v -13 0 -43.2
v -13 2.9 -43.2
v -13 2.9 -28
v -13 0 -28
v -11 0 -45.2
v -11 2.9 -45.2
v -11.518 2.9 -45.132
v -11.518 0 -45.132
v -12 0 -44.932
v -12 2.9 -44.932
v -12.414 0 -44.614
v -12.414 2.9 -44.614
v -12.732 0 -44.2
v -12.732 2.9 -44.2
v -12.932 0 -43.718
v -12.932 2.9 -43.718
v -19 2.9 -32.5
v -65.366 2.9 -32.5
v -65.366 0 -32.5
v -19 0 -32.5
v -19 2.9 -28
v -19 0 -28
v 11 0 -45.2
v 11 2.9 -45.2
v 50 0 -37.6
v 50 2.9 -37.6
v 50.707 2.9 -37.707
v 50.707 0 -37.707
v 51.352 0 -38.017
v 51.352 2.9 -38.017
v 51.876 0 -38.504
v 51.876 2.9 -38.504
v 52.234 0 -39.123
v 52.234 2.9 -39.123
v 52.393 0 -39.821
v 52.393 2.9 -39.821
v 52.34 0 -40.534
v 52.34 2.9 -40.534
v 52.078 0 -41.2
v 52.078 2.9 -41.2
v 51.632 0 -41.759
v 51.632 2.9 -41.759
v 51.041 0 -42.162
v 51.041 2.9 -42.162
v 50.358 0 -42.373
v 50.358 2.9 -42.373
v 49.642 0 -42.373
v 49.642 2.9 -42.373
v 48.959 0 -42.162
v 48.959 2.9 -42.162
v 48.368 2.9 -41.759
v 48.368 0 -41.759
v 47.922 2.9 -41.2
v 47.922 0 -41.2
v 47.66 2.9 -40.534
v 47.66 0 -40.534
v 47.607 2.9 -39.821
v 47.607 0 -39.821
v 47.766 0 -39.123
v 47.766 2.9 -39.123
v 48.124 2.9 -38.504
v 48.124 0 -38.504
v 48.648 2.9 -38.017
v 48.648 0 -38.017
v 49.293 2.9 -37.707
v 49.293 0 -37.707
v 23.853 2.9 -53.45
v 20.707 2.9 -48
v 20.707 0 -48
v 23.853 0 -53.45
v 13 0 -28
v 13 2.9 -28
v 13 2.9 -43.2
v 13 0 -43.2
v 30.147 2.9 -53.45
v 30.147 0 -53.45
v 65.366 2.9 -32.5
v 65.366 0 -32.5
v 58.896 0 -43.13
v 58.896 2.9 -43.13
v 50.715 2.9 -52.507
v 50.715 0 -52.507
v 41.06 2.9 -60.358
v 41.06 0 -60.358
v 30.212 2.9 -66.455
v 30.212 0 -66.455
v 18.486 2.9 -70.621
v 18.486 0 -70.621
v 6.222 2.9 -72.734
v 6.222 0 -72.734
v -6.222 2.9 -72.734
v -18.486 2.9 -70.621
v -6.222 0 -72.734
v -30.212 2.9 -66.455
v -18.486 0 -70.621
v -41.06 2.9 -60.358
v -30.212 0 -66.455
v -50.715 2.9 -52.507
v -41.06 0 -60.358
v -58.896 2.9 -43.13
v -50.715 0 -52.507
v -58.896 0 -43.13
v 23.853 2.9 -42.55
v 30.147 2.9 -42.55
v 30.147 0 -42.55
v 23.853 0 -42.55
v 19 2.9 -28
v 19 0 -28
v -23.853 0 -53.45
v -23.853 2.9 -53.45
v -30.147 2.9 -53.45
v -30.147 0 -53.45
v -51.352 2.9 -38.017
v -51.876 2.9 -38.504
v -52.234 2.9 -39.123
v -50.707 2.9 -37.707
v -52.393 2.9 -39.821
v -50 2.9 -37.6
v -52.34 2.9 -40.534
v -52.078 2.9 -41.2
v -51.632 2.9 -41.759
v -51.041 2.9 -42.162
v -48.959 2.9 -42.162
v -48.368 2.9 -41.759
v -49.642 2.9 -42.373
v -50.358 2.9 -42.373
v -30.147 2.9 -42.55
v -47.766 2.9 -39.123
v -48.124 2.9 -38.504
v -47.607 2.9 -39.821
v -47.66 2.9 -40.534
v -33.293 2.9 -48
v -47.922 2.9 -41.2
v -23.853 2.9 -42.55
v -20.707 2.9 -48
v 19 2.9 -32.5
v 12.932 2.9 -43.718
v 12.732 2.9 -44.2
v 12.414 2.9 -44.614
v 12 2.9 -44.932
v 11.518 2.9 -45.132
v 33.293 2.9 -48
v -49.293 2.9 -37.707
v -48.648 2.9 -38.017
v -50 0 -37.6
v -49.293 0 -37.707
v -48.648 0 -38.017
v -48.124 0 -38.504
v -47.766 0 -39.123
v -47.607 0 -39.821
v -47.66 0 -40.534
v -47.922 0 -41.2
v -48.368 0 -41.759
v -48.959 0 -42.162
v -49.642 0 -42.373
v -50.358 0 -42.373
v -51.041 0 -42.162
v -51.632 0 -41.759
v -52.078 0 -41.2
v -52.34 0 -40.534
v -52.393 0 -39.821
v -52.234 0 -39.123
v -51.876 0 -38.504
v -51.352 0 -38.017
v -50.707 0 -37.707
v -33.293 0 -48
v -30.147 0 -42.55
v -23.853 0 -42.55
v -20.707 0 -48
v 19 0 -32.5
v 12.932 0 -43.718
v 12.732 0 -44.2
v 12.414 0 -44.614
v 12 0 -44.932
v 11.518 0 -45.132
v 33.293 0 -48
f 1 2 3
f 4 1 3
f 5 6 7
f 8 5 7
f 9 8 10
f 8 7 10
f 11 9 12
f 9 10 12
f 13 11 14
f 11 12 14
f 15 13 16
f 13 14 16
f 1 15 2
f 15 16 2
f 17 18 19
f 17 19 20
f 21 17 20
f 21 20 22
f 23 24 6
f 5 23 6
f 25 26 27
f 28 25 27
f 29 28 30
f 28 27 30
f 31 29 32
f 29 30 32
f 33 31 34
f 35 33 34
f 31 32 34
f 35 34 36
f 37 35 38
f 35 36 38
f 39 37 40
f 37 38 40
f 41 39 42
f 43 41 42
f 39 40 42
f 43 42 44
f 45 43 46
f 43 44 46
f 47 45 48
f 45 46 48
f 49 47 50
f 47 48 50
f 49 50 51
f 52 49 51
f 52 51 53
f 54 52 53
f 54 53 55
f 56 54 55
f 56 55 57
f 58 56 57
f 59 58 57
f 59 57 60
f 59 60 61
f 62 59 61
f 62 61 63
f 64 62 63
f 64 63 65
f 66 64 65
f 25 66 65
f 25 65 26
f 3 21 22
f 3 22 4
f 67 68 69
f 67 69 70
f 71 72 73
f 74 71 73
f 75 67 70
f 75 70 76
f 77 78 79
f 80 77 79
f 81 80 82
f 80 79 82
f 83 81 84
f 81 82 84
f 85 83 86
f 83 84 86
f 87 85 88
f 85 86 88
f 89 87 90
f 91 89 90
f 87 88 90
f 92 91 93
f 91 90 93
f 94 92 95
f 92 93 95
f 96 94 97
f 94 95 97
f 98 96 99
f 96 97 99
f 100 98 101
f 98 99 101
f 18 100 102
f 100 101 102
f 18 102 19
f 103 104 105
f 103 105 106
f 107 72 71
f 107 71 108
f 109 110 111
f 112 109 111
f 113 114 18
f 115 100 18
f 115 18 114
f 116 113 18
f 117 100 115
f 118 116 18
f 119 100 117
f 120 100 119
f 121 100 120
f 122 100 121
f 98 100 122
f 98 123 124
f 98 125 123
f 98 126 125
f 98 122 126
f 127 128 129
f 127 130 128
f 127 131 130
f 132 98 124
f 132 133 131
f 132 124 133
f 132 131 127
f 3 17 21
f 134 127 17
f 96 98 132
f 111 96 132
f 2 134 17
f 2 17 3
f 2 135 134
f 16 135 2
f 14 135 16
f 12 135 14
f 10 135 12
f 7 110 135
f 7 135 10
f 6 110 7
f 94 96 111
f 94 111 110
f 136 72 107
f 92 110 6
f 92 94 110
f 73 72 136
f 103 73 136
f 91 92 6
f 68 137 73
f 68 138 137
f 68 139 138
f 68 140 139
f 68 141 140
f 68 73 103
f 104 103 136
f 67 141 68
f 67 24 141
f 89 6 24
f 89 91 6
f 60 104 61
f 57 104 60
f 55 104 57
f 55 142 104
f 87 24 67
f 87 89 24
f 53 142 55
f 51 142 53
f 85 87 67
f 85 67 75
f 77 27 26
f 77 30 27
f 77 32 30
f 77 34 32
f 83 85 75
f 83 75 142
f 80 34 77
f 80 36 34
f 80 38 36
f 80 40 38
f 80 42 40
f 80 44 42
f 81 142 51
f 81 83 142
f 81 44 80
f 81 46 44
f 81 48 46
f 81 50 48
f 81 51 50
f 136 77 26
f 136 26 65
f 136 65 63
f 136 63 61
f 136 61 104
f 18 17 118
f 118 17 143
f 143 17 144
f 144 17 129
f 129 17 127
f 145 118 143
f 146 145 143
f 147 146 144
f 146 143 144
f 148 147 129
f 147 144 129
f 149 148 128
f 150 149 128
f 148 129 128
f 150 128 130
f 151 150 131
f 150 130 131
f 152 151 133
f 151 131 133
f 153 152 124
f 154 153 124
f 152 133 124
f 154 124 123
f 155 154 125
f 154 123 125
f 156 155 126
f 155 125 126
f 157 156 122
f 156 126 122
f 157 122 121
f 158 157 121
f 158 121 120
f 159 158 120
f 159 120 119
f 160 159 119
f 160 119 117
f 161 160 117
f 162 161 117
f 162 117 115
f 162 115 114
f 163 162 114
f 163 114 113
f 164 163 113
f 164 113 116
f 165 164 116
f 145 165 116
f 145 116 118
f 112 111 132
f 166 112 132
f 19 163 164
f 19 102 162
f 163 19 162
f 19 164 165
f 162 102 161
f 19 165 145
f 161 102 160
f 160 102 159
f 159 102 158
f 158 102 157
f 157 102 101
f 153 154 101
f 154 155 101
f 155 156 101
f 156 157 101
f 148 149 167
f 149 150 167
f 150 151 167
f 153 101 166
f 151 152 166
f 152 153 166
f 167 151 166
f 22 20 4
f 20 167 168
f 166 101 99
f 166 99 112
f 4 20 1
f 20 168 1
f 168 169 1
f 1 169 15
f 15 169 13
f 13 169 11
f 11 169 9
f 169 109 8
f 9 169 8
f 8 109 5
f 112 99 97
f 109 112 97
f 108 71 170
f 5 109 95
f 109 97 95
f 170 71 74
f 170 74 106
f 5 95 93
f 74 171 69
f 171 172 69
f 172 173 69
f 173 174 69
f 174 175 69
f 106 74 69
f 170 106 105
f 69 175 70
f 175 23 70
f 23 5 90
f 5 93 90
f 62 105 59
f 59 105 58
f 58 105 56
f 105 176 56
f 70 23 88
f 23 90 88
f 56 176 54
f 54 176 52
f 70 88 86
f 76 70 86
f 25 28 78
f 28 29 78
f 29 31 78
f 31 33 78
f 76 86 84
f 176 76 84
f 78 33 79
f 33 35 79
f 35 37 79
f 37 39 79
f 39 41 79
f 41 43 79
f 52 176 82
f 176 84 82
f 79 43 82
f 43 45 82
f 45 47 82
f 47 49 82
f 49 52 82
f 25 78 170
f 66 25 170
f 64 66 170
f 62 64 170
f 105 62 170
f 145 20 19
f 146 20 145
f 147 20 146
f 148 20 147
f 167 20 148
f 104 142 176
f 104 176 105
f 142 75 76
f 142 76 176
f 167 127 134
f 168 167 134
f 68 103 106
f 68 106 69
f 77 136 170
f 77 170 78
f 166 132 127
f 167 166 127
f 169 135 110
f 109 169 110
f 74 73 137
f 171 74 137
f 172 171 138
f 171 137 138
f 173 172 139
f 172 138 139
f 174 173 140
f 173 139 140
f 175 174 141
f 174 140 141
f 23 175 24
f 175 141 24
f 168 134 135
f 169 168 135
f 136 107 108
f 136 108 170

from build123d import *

# Parameters (mm, degrees)
BOSS_EXTRUDE1_DEPTH  = 2.9
SOLENOID_PLACEMENT_W = 38
SOLENOID_PLACEMENT_H = 64
CUT_EXTRUDE1_DEPTH   = 104.278313309
CUT_EXTRUDE4_DEPTH   = 104.278313309
CUT_EXTRUDE5_DEPTH   = 104.278313309
SKETCH6_R            = 2.4
CUT_EXTRUDE6_DEPTH   = 104.278313309
CUT_EXTRUDE3_DEPTH   = 104.278313309
SKETCH7_W            = 10
SKETCH7_H            = 62.80248699
CUT_EXTRUDE7_DEPTH   = 99.031423533


with BuildPart() as part:
    # Sketch1 → Boss-Extrude1 (new body)
    with BuildSketch(Plane(origin=(0, 0, 0), x_dir=(1, 0, 0), z_dir=(0, 1, 0))):
        with BuildLine():
            ThreePointArc((36.856602833, -63.012624351), (0, 73), (-36.856602833, -63.012624351))
            ThreePointArc((-36.856602833, -63.012624351), (-33.368752207, -63.602994345), (-30.363140064, -61.737536127))
            ThreePointArc((-30.363140064, -61.737536127), (0, -46.75), (30.363140064, -61.737536127))
            ThreePointArc((30.363140064, -61.737536127), (33.368752207, -63.602994345), (36.856602833, -63.012624351))
        make_face()
    extrude(amount=BOSS_EXTRUDE1_DEPTH)

    # solenoid placement → Cut-Extrude1 (cut, through all)
    with BuildSketch(Plane(origin=(0, 2.9, 0), x_dir=(1, 0, 0), z_dir=(0, 1, 0))):
        with Locations((0, -4)):
            Rectangle(SOLENOID_PLACEMENT_W, SOLENOID_PLACEMENT_H)
    extrude(amount=-CUT_EXTRUDE1_DEPTH, mode=Mode.SUBTRACT)

    # Sketch4 → Cut-Extrude4 (cut, through all)
    with BuildSketch(Plane(origin=(0, 2.9, 0), x_dir=(1, 0, 0), z_dir=(0, 1, 0))):
        with BuildLine():
            Line((-13, 28), (13, 28))
            Line((13, 28), (13, 43.2))
            ThreePointArc((13, 43.2), (12.414213562, 44.614213562), (11, 45.2))
            Line((11, 45.2), (-11, 45.2))
            ThreePointArc((-11, 45.2), (-12.414213562, 44.614213562), (-13, 43.2))
            Line((-13, 43.2), (-13, 28))
        make_face()
    extrude(amount=-CUT_EXTRUDE4_DEPTH, mode=Mode.SUBTRACT)

    # Sketch5 → Cut-Extrude5 (cut, through all)
    with BuildSketch(Plane(origin=(0, 2.9, 0), x_dir=(1, 0, 0), z_dir=(0, 1, 0))):
        Polygon((-20.706882066, 48), (-23.853441033, 53.45), (-30.146558967, 53.45), (-33.293117934, 48), (-30.146558967, 42.55), (-23.853441033, 42.55), align=None)
        Polygon((23.853441033, 42.55), (20.706882066, 48), (23.853441033, 53.45), (30.146558967, 53.45), (33.293117934, 48), (30.146558967, 42.55), align=None)
    extrude(amount=-CUT_EXTRUDE5_DEPTH, mode=Mode.SUBTRACT)

    # Sketch6 → Cut-Extrude6 (cut, through all)
    with BuildSketch(Plane(origin=(0, 2.9, 0), x_dir=(1, 0, 0), z_dir=(0, 1, 0))):
        with Locations(Location((40, -40, 0), (0, 0, 270))):
            Circle(SKETCH6_R)
        with Locations(Location((-40, -40, 0), (0, 0, 270))):
            Circle(SKETCH6_R)
        with Locations(Location((-50, 40, 0), (0, 0, 270))):
            Circle(SKETCH6_R)
        with Locations(Location((50, 40, 0), (0, 0, 270))):
            Circle(SKETCH6_R)
    extrude(amount=-CUT_EXTRUDE6_DEPTH, mode=Mode.SUBTRACT)

    # Sketch3 → Cut-Extrude3 (cut, through all)
    with BuildSketch(Plane(origin=(0, 2.9, 0), x_dir=(1, 0, 0), z_dir=(0, 1, 0))):
        Polygon((-19, 28), (19, 28), (19, 32.5), (73, 32.5), (73, -32.5), (-73, -32.5), (-73, 32.5), (-19, 32.5), align=None)
    extrude(amount=-CUT_EXTRUDE3_DEPTH, mode=Mode.SUBTRACT)


with BuildPart() as cut_extrude3_piece_1:
    # of the separate pieces the step leaves, piece 1, a body of its own (cut_extrude3_pieces)
    add(part.part.solids().sort_by_distance((65.366275709, 0, -32.5))[0])


with BuildPart() as cut_extrude3_piece_2:
    # of the separate pieces the step leaves, piece 2, a body of its own (cut_extrude3_pieces)
    add(part.part.solids().sort_by_distance((-36.856602833, 0, 63.012624351))[0])

    # Sketch7 → Cut-Extrude7 (cut, through all)
    with BuildSketch(Plane(origin=(0, 2.9, 0), x_dir=(1, 0, 0), z_dir=(0, 1, 0))):
        with Locations((0, -31.401243495)):
            Rectangle(SKETCH7_W, SKETCH7_H)
    extrude(amount=-CUT_EXTRUDE7_DEPTH, mode=Mode.SUBTRACT)


with BuildPart() as cut_extrude7_piece_1:
    # of the separate pieces the step leaves, piece 1, a body of its own (cut_extrude7_pieces)
    add(cut_extrude3_piece_2.part.solids().sort_by_distance((5, 0, 47.078205475))[0])


with BuildPart() as cut_extrude7_piece_2:
    # of the separate pieces the step leaves, piece 2, a body of its own (cut_extrude7_pieces)
    add(cut_extrude3_piece_2.part.solids().sort_by_distance((-36.856602833, 0, 63.012624351))[0])


solid = cut_extrude3_piece_1.part
